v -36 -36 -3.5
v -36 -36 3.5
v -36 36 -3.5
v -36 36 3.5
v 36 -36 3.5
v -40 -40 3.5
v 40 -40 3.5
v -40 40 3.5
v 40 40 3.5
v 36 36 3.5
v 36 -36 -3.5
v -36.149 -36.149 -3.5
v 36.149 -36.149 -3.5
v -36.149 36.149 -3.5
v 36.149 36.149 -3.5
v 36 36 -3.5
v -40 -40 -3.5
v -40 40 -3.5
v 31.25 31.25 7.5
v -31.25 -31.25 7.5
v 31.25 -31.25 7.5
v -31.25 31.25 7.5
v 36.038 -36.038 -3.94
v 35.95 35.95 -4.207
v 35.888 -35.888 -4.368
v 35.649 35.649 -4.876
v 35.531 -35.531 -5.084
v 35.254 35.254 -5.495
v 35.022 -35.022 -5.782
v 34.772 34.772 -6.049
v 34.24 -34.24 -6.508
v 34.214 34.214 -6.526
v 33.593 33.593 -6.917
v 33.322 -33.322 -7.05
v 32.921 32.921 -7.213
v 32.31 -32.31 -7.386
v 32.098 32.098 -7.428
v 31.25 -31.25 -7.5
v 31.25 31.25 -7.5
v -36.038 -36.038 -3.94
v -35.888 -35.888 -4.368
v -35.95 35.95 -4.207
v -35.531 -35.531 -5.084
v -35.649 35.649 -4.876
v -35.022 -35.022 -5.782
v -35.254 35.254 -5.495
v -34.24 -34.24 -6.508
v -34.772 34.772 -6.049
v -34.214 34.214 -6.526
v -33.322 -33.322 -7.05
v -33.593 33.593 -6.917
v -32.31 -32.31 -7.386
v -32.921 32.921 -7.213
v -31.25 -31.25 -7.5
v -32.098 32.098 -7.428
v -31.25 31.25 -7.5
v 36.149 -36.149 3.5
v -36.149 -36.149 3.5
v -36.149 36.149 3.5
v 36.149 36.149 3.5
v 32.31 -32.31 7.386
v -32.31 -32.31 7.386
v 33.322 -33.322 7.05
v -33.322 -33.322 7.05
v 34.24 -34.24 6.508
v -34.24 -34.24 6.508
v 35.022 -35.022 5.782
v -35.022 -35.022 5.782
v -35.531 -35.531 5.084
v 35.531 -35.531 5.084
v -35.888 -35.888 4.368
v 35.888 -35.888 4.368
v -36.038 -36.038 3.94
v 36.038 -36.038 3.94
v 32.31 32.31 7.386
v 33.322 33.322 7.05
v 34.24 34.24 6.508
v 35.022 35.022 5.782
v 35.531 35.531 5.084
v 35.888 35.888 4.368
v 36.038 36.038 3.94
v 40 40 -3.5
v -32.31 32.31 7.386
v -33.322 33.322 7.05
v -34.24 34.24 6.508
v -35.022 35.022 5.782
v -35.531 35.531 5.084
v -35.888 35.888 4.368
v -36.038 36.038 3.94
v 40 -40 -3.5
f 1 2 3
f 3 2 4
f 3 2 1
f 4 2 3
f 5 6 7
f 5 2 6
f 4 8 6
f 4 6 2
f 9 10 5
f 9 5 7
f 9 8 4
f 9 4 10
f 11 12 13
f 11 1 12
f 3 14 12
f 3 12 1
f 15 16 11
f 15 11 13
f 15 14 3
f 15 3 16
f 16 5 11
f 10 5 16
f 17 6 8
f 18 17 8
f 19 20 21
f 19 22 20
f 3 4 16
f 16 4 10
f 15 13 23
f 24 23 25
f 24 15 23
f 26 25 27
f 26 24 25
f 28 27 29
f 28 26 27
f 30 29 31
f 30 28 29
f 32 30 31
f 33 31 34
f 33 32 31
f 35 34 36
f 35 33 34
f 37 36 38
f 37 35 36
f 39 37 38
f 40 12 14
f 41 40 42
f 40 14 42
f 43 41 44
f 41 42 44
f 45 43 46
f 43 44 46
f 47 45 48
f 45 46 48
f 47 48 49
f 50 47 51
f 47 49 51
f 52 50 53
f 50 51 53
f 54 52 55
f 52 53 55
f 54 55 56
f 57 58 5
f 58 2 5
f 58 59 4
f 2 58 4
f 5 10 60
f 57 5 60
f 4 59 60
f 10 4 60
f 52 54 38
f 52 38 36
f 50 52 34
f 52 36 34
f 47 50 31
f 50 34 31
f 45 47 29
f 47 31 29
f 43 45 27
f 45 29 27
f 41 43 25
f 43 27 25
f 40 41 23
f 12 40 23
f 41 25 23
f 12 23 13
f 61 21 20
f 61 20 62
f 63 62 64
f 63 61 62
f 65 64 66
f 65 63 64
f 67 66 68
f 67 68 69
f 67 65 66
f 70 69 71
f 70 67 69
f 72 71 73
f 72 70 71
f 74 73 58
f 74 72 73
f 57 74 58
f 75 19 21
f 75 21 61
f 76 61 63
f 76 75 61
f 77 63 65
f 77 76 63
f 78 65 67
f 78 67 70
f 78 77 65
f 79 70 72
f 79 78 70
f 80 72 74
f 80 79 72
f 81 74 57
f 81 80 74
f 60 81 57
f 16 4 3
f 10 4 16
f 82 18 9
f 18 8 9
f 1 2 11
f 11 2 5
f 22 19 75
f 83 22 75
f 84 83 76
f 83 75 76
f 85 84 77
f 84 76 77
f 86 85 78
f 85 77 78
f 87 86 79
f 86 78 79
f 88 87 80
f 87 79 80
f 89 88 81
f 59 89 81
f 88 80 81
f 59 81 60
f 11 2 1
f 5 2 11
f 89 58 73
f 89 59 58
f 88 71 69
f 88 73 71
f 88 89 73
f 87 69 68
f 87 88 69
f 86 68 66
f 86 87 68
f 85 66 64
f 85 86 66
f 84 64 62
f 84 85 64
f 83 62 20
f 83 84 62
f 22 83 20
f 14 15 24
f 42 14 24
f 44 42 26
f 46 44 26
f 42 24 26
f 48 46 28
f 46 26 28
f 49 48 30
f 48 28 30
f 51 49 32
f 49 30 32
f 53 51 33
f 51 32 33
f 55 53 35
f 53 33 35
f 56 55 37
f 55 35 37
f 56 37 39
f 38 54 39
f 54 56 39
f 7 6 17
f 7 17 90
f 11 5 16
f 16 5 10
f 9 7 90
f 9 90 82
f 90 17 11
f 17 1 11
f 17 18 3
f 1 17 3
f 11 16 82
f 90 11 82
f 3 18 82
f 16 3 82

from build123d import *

# Parameters (mm, degrees)
F2_W     = 80
F2_H     = 80
F2_W_2   = 72
F2_H_2   = 72
F3_DEPTH = 3.5
F4_W     = 72.5
F4_H     = 72.5
F5_DEPTH = 7.5
F6_R     = 5


with BuildPart() as f3:
    # F2 (on Top) → F3 (new body, symmetric)
    with BuildSketch(Plane.XY):
        Rectangle(F2_W, F2_H)
        Rectangle(F2_W_2, F2_H_2, mode=Mode.SUBTRACT)
    extrude(amount=F3_DEPTH, both=True)


with BuildPart() as f5:
    # F4 (on Top) → F5 (new body, symmetric)
    with BuildSketch(Plane.XY):
        Rectangle(F4_W, F4_H)
    extrude(amount=F5_DEPTH, both=True)

    # F6
    f6_edges = [f5.edges().sort_by_distance(p)[0] for p in [
        (0, -36.25, 7.5),
        (36.25, 0, 7.5),
        (0, 36.25, 7.5),
        (-36.25, 0, 7.5),
        (0, -36.25, -7.5),
        (36.25, 0, -7.5),
        (0, 36.25, -7.5),
        (-36.25, 0, -7.5),
    ]]
    fillet(f6_edges, radius=F6_R)


with BuildPart() as f7_1:
    # F7: copy of F3
    add(f3.part)


with BuildPart() as f5_1:
    add(f5.part)

    # F8: cut F7_1
    add(f7_1.part, mode=Mode.SUBTRACT)


solid = Compound([f3.part, f5_1.part])
